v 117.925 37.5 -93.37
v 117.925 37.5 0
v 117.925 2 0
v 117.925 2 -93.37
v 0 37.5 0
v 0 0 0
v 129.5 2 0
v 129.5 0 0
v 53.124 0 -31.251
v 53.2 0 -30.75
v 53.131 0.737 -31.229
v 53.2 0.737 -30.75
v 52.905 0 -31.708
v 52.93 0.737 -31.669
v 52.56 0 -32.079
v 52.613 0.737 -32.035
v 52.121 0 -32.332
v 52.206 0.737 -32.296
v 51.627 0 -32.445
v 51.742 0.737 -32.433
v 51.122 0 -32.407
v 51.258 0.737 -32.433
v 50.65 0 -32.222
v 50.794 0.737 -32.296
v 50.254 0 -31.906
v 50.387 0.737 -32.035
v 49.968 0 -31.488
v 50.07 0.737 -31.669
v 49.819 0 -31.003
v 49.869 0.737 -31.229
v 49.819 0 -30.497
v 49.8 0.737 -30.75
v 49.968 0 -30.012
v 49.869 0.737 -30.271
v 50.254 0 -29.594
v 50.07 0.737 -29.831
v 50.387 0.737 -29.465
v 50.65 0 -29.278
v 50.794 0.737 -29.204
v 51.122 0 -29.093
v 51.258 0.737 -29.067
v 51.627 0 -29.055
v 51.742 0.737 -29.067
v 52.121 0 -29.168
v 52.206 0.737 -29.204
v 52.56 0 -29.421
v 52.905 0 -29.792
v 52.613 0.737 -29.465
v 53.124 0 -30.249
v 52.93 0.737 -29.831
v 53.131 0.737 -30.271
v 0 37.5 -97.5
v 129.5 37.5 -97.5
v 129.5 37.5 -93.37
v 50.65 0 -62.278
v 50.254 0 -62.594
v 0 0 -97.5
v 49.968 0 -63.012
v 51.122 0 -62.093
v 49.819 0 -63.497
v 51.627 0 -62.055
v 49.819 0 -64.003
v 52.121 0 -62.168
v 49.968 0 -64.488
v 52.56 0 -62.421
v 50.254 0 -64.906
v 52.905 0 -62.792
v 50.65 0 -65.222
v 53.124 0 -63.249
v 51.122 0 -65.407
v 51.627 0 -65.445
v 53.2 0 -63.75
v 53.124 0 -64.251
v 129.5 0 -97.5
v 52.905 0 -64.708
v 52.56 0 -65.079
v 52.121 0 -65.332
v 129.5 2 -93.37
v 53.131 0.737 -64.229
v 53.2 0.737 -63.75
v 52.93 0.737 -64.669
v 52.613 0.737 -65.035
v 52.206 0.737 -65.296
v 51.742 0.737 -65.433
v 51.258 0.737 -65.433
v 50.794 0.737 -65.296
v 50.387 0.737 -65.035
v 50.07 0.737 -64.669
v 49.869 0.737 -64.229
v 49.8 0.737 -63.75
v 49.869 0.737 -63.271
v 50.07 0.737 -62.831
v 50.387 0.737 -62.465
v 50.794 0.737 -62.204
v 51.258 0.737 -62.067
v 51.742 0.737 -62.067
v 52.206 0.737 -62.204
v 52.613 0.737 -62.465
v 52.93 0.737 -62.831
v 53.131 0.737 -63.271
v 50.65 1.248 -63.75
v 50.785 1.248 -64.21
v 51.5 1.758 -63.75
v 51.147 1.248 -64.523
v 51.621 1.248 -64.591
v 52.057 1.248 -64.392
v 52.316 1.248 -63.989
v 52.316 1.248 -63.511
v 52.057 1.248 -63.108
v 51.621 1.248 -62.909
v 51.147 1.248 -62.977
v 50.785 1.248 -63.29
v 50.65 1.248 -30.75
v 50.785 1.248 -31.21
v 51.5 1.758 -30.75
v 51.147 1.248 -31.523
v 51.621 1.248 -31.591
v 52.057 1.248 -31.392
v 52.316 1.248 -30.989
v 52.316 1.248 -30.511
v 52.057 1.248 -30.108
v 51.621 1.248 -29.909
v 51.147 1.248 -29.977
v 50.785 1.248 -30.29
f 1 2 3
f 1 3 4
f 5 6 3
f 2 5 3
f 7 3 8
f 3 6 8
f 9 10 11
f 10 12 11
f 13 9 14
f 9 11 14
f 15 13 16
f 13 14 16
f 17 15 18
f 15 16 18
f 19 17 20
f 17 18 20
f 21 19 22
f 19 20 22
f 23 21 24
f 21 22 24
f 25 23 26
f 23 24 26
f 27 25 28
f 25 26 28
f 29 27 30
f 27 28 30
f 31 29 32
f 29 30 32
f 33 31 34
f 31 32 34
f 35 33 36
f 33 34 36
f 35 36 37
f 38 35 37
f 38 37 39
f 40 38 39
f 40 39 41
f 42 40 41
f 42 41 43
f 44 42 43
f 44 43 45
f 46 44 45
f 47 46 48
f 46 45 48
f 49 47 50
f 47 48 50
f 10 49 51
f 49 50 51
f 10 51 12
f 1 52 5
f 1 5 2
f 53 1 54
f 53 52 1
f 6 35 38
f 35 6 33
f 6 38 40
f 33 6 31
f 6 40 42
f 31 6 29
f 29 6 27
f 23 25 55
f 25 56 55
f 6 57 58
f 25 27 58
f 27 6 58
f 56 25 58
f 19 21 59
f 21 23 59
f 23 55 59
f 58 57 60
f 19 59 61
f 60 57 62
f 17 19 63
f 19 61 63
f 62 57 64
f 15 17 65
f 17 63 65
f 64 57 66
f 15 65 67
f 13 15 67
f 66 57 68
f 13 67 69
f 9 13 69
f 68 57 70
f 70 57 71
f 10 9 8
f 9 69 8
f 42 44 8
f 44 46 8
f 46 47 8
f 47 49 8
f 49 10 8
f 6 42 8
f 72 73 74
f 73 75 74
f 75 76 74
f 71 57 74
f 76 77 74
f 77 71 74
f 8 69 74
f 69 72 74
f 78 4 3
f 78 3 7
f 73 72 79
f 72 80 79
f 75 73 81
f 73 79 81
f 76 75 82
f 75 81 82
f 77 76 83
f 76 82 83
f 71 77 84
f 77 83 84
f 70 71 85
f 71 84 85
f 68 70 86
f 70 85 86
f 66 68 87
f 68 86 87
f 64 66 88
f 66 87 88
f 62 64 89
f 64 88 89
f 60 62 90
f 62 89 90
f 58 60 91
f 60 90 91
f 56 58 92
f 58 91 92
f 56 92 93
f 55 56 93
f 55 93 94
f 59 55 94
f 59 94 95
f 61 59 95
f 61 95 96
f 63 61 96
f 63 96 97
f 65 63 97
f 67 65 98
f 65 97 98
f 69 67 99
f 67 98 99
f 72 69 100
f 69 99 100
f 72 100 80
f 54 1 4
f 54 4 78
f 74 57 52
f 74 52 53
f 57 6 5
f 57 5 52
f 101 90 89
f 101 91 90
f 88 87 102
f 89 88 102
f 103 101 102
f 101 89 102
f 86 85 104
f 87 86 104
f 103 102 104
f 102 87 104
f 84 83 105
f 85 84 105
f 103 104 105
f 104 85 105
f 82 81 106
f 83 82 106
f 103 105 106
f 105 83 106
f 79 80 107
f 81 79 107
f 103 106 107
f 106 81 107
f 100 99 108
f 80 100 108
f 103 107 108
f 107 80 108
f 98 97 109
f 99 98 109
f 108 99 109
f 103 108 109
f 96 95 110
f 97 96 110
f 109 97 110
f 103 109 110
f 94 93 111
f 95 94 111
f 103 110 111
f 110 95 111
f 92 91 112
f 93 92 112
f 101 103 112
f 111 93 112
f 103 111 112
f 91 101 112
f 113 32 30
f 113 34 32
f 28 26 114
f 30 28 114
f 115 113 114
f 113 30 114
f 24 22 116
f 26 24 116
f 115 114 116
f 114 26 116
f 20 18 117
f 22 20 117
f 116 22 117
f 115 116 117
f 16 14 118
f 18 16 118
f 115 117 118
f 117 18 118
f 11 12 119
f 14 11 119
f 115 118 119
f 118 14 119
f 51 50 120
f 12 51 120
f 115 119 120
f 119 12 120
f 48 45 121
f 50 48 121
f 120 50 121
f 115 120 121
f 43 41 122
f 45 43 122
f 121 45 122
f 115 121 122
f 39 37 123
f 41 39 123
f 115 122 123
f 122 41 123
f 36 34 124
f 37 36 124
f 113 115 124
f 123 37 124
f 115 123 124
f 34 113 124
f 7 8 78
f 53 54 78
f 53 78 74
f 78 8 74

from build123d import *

# Parameters (mm, degrees)
SKETCH1_W                = 129.5
SKETCH1_H                = 97.5
BOSS_EXTRUDE1_DEPTH      = 37.5
M3_CLEARANCE_HOLE1_D     = 3.4
M3_CLEARANCE_HOLE1_DEPTH = 0.737
M3_CLEARANCE_HOLE1_TIP   = 1.021463052
SKETCH5_W                = 11.575237046
SKETCH5_H                = 93.370280938
CUT_EXTRUDE1_DEPTH       = 35.5


with BuildPart() as part:
    # Sketch1 → Boss-Extrude1 (new body)
    with BuildSketch(Plane(origin=(0, 0, 0), x_dir=(1, 0, 0), z_dir=(0, 1, 0))):
        with Locations((64.75, 48.75)):
            Rectangle(SKETCH1_W, SKETCH1_H)
    extrude(amount=BOSS_EXTRUDE1_DEPTH)

    # M3 Clearance Hole1
    with Locations(Plane(origin=(0, 0, 0), x_dir=(-1, 0, 0), z_dir=(0, -1, 0))):
        with Locations((-51.5, 63.75), (-51.5, 30.75)):
            Hole(M3_CLEARANCE_HOLE1_D / 2, depth=M3_CLEARANCE_HOLE1_DEPTH)
            with Locations((0, 0, -(M3_CLEARANCE_HOLE1_DEPTH + M3_CLEARANCE_HOLE1_TIP / 2))):  # 118° drill point
                Cone(0, M3_CLEARANCE_HOLE1_D / 2, M3_CLEARANCE_HOLE1_TIP, mode=Mode.SUBTRACT)

    # Sketch5 → Cut-Extrude1 (cut)
    with BuildSketch(Plane(origin=(0, 37.5, 0), x_dir=(1, 0, 0), z_dir=(0, 1, 0))):
        with Locations((123.712381477, 46.685140469)):
            Rectangle(SKETCH5_W, SKETCH5_H)
    extrude(amount=-CUT_EXTRUDE1_DEPTH, mode=Mode.SUBTRACT)


solid = part.part
